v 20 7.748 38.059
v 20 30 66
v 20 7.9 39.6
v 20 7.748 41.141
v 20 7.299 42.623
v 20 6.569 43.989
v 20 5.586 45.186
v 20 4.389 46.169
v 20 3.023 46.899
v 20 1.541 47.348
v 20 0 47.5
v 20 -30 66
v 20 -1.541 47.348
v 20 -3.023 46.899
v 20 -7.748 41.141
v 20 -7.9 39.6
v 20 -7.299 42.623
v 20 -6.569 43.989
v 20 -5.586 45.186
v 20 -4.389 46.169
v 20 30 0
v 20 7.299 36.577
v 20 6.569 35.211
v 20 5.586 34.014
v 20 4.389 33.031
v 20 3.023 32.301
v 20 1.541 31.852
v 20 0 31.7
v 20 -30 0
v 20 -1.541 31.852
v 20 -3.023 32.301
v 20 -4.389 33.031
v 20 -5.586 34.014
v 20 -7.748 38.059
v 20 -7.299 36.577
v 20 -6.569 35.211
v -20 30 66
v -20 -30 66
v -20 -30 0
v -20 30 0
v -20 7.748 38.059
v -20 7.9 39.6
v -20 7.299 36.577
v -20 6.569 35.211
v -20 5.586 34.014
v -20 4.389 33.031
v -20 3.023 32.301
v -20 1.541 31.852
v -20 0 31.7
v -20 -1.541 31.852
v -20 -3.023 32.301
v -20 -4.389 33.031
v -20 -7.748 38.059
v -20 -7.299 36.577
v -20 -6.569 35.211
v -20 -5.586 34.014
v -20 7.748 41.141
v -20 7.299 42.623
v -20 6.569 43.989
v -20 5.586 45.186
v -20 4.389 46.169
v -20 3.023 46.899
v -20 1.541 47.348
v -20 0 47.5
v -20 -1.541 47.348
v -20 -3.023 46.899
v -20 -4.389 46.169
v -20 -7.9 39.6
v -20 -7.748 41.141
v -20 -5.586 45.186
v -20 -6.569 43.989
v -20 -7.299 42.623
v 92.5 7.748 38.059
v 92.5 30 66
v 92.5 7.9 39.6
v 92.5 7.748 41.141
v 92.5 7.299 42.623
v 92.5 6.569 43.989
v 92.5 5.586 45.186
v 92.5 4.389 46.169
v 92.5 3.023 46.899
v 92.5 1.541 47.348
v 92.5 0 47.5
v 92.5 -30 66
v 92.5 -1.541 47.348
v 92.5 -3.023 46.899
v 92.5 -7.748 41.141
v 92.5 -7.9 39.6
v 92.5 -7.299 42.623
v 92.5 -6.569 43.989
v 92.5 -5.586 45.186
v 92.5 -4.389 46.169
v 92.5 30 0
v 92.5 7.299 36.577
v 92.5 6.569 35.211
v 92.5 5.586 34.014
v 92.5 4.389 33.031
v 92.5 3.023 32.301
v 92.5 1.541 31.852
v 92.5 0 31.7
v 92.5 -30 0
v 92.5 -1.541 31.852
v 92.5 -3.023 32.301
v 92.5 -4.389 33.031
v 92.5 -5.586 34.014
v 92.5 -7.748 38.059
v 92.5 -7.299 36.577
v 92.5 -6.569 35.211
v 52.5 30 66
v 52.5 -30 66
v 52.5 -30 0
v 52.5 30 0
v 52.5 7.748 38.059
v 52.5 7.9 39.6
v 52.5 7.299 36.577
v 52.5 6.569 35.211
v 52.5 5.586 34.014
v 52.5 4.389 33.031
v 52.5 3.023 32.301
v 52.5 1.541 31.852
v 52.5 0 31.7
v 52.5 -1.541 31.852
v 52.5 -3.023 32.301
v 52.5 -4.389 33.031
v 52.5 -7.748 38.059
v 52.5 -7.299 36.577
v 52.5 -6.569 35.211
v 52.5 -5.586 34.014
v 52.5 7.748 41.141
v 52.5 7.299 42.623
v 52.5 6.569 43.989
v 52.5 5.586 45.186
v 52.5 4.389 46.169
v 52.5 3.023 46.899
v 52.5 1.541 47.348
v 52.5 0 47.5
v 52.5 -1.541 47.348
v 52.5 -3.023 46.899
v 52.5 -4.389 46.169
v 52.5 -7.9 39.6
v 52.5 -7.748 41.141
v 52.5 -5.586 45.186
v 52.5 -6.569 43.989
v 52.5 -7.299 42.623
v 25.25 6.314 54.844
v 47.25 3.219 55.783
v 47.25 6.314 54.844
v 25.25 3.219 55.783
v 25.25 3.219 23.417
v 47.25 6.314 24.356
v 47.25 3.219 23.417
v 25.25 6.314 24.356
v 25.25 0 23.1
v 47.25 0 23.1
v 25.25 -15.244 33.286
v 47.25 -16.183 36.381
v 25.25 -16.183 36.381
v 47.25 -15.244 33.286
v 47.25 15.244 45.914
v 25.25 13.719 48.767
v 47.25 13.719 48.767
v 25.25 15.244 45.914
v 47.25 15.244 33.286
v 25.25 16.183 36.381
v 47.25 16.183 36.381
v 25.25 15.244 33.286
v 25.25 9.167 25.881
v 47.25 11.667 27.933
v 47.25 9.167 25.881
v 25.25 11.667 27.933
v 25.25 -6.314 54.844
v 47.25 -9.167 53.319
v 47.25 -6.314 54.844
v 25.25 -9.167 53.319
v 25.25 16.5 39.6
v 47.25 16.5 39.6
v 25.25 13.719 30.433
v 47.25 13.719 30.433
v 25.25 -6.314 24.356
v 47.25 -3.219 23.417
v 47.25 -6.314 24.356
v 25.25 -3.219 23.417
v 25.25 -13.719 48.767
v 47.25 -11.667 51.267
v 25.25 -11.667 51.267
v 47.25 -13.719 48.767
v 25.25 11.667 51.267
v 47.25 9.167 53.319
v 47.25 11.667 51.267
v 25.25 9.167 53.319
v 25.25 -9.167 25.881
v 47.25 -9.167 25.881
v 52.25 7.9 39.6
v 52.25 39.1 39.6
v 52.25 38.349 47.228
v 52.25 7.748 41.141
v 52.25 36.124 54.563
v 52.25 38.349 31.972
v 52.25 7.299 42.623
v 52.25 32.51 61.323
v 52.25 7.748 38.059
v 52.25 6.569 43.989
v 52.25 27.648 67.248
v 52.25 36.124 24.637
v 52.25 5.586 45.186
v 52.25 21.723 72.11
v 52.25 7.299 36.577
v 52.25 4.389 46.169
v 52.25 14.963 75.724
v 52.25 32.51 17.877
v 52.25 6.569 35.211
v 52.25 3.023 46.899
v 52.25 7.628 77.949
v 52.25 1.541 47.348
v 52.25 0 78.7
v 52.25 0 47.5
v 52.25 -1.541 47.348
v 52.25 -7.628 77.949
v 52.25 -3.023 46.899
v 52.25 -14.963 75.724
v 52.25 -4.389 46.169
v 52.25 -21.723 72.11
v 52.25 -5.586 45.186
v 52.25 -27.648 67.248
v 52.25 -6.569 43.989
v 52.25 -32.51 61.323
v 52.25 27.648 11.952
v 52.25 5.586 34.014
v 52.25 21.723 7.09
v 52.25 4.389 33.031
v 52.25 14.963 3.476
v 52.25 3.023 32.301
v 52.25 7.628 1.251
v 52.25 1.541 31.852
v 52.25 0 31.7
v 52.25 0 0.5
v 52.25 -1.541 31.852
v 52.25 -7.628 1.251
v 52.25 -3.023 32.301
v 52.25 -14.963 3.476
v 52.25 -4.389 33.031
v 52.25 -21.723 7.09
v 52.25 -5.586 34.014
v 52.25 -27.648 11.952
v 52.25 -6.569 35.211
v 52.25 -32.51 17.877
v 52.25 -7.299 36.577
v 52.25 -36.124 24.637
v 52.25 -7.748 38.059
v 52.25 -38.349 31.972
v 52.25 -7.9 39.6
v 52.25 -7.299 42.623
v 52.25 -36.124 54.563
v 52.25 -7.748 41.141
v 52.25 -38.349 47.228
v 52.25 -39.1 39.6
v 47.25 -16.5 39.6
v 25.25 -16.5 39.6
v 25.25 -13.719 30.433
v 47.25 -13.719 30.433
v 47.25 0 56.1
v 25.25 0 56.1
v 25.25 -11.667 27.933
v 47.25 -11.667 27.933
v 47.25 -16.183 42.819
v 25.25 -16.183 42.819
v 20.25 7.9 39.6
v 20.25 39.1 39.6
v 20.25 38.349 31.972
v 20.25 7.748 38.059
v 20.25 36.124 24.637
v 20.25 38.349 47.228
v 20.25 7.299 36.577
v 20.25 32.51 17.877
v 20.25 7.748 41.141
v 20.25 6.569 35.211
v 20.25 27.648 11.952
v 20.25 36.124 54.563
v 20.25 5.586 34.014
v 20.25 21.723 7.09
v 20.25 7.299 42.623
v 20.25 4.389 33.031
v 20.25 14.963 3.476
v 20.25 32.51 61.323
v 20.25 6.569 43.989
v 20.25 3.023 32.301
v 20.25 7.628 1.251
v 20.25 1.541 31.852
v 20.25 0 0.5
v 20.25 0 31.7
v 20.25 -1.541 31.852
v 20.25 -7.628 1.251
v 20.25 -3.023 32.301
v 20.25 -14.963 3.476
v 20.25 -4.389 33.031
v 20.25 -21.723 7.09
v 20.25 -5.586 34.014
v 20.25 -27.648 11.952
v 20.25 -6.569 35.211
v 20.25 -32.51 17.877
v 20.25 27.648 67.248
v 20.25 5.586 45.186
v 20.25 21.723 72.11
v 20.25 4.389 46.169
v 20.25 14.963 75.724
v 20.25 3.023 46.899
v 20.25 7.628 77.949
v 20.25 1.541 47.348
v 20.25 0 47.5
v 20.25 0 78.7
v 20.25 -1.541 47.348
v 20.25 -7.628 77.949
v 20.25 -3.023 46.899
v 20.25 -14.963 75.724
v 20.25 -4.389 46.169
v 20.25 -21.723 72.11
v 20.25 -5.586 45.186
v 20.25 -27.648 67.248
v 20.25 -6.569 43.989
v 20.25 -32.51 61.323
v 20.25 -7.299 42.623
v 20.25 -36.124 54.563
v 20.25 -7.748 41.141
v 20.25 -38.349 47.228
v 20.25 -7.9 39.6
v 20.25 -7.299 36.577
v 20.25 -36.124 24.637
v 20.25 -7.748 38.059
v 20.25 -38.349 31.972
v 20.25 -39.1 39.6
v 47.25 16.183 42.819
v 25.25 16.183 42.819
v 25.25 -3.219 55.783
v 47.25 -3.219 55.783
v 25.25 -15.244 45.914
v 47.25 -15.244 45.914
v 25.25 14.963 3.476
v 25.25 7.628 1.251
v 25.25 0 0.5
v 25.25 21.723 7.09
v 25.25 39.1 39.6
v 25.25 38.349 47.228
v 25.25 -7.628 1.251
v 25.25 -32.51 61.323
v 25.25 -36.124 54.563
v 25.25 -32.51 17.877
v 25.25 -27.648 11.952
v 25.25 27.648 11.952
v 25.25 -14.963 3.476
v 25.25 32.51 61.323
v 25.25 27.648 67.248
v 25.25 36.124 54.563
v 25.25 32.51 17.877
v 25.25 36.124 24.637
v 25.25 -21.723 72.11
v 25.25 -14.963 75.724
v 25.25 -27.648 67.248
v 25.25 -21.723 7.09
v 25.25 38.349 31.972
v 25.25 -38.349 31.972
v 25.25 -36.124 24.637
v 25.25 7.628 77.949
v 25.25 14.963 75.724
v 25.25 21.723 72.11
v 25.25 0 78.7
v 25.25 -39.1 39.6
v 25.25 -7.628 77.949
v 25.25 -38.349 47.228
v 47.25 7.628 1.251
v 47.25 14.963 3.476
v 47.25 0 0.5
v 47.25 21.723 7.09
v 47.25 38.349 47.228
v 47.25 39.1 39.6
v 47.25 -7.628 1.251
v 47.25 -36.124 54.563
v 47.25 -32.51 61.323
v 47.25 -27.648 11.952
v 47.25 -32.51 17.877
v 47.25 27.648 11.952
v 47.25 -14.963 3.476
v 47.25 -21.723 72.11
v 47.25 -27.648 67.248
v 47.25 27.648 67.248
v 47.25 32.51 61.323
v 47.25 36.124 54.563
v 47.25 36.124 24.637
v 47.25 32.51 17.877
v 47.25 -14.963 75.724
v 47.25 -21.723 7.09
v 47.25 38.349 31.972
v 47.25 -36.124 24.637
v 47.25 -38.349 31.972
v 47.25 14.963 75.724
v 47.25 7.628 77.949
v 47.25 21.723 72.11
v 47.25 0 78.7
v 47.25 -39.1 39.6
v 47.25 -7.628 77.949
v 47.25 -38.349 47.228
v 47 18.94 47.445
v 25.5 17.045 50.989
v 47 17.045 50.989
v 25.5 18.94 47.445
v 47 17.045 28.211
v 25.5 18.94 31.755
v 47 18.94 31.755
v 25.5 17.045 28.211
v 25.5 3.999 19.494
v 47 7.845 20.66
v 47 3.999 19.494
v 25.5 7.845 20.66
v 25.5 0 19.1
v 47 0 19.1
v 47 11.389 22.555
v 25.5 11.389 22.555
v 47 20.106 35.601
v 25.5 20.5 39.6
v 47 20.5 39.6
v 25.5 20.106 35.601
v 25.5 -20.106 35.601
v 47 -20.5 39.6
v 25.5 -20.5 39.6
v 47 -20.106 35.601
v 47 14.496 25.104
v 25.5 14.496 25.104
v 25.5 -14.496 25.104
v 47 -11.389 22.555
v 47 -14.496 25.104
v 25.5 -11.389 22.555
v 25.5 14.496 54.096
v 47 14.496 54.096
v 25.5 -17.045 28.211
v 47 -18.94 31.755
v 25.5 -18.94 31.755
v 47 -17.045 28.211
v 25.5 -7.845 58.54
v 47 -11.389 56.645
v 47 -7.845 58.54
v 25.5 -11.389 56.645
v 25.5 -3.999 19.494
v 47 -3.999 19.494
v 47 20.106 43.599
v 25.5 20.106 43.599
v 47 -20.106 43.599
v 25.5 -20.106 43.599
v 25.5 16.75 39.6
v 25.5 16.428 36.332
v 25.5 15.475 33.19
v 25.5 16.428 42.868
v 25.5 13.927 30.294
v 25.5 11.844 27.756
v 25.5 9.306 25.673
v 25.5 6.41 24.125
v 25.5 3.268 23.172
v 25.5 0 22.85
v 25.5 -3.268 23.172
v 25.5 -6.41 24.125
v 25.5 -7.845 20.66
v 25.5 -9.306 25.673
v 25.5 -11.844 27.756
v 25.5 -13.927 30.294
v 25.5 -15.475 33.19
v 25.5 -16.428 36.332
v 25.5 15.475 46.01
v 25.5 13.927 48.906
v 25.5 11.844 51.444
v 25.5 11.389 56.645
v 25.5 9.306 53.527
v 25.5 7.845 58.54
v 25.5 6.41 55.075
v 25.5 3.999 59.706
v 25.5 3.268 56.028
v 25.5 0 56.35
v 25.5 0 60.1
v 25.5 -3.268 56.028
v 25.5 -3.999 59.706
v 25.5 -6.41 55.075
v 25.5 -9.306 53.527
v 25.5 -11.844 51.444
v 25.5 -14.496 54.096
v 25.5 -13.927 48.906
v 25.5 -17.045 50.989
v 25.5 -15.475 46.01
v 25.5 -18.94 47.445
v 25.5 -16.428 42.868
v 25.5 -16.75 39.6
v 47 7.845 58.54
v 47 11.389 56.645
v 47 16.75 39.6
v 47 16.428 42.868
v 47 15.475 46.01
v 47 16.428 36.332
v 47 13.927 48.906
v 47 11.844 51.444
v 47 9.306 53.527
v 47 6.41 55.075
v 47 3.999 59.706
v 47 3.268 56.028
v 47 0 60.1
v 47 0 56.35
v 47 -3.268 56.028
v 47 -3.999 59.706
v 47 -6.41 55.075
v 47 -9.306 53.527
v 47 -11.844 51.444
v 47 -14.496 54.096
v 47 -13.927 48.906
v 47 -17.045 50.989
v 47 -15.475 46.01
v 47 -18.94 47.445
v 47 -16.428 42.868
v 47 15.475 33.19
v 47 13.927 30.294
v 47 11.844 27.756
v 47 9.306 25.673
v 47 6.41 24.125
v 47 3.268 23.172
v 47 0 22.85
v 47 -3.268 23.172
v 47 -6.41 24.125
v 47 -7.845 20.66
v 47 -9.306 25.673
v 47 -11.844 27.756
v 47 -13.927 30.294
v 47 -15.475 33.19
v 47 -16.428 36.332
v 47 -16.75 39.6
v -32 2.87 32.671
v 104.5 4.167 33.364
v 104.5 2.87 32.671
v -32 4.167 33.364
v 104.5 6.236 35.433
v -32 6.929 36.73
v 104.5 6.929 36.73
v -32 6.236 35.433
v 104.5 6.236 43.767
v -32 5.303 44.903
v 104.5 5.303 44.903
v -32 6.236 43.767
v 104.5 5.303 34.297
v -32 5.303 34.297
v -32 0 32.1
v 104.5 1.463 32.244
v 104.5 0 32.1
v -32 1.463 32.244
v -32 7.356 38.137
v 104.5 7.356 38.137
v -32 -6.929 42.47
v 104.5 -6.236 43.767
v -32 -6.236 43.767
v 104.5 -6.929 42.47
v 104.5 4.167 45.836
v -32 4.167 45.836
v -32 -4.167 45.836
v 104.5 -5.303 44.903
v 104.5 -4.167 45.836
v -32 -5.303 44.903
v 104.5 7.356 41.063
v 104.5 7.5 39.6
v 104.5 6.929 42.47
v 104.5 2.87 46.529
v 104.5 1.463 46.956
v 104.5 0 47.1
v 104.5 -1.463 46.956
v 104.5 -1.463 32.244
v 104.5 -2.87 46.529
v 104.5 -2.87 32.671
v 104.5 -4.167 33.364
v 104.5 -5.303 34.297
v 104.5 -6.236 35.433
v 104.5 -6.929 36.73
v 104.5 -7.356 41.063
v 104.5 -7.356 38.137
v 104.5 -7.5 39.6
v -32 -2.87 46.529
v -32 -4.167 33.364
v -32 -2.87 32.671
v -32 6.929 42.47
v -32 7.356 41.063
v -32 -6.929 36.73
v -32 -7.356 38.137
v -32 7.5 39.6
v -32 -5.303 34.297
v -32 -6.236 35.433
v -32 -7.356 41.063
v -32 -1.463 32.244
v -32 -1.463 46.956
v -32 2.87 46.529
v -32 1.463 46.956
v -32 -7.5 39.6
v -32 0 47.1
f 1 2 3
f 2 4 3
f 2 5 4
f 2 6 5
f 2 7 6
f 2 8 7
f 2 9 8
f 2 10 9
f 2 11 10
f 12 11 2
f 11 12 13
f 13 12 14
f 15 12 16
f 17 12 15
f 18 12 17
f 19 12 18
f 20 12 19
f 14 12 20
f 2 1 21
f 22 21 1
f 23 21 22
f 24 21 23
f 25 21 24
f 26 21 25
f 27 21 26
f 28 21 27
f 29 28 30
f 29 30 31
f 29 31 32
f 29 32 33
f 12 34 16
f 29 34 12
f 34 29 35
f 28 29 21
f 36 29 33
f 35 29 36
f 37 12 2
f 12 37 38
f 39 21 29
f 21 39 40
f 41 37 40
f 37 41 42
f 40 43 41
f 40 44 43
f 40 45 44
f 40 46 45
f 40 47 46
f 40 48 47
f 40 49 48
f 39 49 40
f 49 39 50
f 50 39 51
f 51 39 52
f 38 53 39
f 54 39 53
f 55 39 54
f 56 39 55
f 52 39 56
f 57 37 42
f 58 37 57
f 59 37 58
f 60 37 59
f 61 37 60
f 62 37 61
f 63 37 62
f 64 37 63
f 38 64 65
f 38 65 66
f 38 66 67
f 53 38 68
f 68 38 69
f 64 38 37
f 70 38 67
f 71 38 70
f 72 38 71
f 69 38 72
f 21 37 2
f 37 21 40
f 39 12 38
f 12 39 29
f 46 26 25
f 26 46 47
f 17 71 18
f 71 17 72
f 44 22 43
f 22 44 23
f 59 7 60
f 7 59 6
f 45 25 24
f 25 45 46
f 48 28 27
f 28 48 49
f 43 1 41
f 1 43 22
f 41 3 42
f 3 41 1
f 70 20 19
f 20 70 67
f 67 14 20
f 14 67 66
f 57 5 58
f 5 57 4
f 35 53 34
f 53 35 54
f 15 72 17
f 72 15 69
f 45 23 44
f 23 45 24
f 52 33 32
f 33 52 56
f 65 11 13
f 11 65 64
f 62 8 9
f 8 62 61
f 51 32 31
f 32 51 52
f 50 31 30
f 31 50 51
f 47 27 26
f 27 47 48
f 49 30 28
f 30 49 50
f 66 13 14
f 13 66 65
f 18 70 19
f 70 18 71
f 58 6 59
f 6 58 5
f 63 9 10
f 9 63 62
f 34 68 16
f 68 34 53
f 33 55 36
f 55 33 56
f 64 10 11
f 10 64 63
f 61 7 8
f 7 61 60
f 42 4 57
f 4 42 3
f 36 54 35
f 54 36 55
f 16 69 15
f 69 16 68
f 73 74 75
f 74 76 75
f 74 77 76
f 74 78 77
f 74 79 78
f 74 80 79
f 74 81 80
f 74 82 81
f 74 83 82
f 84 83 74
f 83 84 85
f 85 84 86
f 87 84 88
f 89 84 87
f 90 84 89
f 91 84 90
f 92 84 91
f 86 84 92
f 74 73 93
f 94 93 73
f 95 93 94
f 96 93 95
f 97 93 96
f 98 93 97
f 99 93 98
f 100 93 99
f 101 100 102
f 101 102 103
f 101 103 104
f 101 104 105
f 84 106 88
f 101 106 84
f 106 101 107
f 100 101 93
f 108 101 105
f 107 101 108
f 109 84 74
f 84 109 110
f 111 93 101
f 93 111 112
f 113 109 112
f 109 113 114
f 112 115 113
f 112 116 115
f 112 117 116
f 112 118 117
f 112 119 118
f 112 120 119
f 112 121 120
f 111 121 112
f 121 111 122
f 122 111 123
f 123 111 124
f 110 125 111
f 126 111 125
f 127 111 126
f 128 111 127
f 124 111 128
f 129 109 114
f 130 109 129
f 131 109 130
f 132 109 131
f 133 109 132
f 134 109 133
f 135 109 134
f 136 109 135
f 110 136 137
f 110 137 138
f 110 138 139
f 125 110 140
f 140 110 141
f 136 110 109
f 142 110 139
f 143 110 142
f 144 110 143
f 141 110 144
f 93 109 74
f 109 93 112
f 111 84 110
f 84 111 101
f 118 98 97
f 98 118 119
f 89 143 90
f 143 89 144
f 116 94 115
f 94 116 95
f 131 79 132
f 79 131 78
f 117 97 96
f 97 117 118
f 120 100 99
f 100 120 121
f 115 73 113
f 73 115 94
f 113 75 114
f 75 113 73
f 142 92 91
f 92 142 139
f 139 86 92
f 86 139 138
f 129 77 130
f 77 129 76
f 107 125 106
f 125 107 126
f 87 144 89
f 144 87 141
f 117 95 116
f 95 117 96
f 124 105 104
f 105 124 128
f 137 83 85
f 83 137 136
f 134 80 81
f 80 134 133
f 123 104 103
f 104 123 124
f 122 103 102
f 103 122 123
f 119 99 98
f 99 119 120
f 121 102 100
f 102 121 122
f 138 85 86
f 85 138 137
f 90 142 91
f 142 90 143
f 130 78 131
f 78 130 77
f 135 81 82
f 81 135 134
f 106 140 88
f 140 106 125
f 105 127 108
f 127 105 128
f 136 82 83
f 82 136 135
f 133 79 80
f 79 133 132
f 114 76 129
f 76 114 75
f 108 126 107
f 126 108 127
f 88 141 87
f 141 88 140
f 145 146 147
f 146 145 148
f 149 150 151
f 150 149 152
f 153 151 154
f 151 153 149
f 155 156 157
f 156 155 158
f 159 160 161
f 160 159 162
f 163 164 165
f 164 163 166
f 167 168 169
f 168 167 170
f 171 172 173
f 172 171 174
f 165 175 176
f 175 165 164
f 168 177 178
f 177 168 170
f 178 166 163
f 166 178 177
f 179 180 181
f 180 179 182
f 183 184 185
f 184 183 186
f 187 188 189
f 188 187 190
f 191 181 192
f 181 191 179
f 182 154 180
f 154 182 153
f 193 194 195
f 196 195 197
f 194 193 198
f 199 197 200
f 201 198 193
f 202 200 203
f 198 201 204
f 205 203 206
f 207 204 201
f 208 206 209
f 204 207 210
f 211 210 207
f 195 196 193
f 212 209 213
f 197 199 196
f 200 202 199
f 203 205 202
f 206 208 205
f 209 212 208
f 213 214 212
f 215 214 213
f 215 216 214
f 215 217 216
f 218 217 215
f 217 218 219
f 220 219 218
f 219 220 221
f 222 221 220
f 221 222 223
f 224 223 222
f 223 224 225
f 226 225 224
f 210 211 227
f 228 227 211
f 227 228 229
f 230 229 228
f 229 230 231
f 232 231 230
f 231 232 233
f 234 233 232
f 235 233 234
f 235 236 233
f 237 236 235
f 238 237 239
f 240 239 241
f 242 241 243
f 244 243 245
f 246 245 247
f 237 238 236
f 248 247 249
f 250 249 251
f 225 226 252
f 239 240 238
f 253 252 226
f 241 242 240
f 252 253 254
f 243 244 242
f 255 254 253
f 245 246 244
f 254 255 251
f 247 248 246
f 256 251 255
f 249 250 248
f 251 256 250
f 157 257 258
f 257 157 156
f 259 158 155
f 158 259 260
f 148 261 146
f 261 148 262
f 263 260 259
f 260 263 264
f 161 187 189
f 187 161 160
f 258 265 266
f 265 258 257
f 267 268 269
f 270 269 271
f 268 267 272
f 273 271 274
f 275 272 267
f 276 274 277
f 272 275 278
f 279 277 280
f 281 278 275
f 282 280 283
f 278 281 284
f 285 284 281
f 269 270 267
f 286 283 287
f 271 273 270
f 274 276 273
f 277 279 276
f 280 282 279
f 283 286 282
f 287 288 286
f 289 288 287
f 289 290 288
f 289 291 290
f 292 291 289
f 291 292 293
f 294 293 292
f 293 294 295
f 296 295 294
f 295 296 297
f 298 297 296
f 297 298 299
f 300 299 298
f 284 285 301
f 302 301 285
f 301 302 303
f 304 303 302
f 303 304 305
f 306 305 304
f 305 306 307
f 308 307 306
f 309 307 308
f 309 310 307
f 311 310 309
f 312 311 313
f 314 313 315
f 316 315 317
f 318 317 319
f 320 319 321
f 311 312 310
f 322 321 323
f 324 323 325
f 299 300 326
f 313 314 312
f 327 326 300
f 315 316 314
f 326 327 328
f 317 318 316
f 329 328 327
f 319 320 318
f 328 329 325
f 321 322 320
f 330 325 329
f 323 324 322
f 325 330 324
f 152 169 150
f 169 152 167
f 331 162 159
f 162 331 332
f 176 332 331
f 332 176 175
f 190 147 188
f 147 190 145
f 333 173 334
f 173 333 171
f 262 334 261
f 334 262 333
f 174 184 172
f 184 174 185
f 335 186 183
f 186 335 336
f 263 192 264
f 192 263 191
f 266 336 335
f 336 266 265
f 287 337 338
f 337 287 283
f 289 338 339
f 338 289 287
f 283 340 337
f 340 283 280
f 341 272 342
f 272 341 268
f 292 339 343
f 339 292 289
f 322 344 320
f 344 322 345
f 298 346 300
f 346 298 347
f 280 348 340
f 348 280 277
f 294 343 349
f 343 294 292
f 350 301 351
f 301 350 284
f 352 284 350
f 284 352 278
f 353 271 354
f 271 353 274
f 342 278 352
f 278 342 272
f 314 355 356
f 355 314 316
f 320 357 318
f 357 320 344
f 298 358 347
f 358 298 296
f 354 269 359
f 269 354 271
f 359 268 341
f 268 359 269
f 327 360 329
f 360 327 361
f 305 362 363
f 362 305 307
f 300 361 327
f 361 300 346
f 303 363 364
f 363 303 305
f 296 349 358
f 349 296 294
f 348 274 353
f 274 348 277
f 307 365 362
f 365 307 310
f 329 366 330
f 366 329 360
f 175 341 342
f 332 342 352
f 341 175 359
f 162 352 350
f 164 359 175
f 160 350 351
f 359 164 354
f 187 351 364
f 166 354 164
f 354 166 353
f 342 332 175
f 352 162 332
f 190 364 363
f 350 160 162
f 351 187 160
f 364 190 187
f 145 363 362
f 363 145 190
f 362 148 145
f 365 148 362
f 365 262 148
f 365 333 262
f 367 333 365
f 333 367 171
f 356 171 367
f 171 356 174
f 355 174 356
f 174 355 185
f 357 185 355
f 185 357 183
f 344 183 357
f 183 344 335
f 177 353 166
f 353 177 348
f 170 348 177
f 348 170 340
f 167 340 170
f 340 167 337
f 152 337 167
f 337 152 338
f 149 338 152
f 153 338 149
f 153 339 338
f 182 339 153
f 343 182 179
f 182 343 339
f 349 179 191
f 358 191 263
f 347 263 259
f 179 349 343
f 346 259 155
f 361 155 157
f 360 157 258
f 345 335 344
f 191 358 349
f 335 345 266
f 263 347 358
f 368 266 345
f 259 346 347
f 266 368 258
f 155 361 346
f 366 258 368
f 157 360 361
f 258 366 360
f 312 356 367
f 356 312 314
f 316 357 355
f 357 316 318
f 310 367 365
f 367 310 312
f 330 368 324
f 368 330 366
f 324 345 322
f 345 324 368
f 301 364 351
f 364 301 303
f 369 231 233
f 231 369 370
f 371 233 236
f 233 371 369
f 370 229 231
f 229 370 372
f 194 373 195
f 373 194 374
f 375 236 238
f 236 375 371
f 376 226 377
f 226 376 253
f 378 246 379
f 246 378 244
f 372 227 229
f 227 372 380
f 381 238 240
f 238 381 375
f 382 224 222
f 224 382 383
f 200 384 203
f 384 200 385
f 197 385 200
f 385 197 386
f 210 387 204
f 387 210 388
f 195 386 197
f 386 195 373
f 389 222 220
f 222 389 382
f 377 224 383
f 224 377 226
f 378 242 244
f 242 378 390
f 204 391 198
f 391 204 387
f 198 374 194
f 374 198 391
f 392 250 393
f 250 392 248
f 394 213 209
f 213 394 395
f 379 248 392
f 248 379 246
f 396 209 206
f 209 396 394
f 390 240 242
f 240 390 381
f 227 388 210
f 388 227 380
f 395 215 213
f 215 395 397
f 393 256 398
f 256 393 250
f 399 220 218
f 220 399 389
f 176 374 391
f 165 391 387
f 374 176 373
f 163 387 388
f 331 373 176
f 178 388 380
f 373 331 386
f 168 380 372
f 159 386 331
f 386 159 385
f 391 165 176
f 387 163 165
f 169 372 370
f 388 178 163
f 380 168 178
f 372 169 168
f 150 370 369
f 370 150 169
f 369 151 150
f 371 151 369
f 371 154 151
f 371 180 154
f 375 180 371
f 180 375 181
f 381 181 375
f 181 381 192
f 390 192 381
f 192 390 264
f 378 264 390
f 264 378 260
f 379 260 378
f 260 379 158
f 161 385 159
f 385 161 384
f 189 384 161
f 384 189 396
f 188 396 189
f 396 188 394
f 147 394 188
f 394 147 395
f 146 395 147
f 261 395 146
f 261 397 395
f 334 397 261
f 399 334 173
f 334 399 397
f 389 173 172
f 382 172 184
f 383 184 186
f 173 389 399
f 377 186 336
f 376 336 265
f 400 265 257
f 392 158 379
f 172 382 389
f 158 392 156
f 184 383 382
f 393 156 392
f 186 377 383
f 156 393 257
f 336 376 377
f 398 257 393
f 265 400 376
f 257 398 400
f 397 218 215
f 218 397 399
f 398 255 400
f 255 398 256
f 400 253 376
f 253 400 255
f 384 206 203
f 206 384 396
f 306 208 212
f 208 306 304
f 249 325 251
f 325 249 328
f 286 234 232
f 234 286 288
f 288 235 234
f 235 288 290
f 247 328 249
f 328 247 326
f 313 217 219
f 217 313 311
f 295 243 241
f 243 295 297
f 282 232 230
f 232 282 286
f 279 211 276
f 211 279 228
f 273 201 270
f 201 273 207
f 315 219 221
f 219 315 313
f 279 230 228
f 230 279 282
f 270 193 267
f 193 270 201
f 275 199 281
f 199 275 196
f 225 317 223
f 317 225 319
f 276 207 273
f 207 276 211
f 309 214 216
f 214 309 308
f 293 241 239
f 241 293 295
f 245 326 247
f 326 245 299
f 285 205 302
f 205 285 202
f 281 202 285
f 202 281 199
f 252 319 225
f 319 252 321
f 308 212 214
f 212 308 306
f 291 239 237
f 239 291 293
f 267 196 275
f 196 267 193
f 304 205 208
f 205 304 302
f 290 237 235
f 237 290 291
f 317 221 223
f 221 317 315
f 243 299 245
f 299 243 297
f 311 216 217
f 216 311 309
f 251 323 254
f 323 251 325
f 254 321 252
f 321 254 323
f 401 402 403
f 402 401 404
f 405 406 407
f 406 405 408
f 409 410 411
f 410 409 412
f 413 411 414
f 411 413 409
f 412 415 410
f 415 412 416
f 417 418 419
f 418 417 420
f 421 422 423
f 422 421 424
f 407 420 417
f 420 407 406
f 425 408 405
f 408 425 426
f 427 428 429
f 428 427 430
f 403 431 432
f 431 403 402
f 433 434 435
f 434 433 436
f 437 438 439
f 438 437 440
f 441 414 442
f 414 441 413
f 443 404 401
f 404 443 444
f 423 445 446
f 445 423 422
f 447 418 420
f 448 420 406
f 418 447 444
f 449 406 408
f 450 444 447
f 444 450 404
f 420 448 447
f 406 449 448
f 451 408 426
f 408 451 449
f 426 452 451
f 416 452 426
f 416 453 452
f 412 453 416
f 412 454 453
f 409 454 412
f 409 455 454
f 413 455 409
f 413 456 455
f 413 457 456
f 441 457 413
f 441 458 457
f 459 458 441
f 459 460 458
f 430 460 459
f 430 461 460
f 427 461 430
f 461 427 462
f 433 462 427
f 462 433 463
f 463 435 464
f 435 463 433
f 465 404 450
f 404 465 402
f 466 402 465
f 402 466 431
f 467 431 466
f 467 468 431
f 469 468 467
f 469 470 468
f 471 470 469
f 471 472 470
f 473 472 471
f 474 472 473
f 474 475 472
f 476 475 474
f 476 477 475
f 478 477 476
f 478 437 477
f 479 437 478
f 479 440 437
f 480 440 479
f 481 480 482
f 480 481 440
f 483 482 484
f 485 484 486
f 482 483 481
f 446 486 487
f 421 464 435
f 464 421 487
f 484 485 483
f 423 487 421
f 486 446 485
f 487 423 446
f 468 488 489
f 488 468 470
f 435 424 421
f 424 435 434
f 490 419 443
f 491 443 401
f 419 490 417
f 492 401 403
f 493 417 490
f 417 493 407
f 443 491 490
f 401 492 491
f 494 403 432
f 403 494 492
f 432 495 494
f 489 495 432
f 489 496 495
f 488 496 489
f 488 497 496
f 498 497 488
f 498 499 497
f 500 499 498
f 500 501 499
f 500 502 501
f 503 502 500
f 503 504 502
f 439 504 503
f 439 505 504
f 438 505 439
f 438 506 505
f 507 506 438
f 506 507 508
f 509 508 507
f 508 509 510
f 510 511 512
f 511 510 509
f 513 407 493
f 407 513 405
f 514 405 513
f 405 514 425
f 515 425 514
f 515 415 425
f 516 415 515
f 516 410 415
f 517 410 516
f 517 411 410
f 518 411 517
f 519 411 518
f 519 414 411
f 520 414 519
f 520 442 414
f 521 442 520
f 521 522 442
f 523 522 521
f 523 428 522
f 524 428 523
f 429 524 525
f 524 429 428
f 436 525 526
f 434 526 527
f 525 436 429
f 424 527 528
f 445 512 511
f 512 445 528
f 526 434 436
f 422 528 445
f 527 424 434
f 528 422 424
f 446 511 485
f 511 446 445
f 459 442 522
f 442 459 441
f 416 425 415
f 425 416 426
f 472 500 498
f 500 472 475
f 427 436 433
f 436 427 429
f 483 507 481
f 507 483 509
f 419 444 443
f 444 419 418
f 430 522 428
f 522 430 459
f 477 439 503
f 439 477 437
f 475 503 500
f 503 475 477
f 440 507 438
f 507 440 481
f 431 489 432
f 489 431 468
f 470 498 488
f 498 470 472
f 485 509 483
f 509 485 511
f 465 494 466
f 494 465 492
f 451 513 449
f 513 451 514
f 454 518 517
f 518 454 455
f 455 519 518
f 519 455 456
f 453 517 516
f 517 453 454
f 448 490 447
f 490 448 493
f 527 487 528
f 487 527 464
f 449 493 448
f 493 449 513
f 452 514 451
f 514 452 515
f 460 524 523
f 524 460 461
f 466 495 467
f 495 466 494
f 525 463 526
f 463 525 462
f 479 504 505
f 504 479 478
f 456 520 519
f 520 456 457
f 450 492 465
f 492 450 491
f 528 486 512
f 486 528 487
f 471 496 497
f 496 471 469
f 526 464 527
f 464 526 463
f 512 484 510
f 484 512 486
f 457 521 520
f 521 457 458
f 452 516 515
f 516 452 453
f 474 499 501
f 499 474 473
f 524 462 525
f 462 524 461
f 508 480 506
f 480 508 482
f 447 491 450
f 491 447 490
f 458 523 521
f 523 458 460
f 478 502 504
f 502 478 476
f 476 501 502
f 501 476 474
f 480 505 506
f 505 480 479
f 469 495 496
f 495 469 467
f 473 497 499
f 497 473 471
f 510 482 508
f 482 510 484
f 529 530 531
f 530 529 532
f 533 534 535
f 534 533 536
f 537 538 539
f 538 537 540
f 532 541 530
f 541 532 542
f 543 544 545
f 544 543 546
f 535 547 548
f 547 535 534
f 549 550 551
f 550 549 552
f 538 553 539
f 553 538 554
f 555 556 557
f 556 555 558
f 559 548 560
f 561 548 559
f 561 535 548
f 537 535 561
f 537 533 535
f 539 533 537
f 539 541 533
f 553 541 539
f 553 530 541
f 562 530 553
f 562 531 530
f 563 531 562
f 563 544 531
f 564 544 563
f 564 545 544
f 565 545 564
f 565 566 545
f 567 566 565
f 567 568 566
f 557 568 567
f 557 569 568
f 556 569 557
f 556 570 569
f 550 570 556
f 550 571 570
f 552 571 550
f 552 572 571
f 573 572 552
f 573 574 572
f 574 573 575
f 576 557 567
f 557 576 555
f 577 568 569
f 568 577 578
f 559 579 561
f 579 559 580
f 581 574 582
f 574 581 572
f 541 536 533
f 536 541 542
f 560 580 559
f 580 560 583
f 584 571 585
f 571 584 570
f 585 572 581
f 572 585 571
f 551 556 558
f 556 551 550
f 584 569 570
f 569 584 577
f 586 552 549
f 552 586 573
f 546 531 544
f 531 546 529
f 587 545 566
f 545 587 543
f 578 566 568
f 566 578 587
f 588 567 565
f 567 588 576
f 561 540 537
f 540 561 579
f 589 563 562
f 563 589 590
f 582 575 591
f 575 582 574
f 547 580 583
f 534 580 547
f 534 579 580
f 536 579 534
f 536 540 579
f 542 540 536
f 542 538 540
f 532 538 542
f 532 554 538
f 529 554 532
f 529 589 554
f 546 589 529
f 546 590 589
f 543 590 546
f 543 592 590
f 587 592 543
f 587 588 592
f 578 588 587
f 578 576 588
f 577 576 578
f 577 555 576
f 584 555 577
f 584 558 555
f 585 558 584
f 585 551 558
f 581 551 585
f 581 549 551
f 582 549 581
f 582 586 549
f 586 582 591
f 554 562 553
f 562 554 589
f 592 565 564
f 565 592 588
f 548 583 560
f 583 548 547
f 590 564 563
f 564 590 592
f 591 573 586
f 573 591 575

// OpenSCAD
$fn = 32;

// ------------------------------------------------------------------------
// Pulley assembly: d78.2 pulley with a belt, shaft d15
// Every part is its own module, assembly() places them once.
// ------------------------------------------------------------------------

// --- part 1 ---
module support1() {
  difference() {
    translate([-20, -30, 0]) cube([40, 60, 66]);
    translate([0, 0, 39.6]) rotate([0, 90, 0]) cylinder(h = 42, d = 15.8, center = true);
  }
}

// --- part 2 ---
module support2() {
  difference() {
    translate([-20, -30, 0]) cube([40, 60, 66]);
    translate([0, 0, 39.6]) rotate([0, 90, 0]) cylinder(h = 42, d = 15.8, center = true);
  }
}

// --- part 3 ---
module shaft() {
  translate([0, 0, -68.25]) cylinder(h = 136.5, d = 15);
}

// --- part 4 ---
module pulley() {
  difference() {
    union() {
      cylinder(h = 32, d = 33);
      cylinder(h = 5, d = 78.2);
      translate([0, 0, 27]) cylinder(h = 5, d = 78.2);
    }
    translate([0, 0, -1]) cylinder(h = 34, d = 15.8);
  }
}

// --- part 5 ---
module belt() {
  difference() {
      translate([0, 0, 0]) cylinder(h = 21.5, d = 41);
      translate([0, 0, -1]) cylinder(h = 23.5, d = 33.5);
    }
}

// --- assembly ---
module assembly() {
  translate([0, 0, 0]) rotate([0, 0, 0]) support1();
  translate([72.5, 0, 0]) rotate([0, 0, 0]) support2();
  translate([36.25, 0, 39.6]) rotate([0, 90, 0]) shaft();
  translate([20.25, 0, 39.6]) rotate([0, 90, 0]) pulley();
  translate([25.5, 0, 39.6]) rotate([0, 90, 0]) belt();
}

assembly();
